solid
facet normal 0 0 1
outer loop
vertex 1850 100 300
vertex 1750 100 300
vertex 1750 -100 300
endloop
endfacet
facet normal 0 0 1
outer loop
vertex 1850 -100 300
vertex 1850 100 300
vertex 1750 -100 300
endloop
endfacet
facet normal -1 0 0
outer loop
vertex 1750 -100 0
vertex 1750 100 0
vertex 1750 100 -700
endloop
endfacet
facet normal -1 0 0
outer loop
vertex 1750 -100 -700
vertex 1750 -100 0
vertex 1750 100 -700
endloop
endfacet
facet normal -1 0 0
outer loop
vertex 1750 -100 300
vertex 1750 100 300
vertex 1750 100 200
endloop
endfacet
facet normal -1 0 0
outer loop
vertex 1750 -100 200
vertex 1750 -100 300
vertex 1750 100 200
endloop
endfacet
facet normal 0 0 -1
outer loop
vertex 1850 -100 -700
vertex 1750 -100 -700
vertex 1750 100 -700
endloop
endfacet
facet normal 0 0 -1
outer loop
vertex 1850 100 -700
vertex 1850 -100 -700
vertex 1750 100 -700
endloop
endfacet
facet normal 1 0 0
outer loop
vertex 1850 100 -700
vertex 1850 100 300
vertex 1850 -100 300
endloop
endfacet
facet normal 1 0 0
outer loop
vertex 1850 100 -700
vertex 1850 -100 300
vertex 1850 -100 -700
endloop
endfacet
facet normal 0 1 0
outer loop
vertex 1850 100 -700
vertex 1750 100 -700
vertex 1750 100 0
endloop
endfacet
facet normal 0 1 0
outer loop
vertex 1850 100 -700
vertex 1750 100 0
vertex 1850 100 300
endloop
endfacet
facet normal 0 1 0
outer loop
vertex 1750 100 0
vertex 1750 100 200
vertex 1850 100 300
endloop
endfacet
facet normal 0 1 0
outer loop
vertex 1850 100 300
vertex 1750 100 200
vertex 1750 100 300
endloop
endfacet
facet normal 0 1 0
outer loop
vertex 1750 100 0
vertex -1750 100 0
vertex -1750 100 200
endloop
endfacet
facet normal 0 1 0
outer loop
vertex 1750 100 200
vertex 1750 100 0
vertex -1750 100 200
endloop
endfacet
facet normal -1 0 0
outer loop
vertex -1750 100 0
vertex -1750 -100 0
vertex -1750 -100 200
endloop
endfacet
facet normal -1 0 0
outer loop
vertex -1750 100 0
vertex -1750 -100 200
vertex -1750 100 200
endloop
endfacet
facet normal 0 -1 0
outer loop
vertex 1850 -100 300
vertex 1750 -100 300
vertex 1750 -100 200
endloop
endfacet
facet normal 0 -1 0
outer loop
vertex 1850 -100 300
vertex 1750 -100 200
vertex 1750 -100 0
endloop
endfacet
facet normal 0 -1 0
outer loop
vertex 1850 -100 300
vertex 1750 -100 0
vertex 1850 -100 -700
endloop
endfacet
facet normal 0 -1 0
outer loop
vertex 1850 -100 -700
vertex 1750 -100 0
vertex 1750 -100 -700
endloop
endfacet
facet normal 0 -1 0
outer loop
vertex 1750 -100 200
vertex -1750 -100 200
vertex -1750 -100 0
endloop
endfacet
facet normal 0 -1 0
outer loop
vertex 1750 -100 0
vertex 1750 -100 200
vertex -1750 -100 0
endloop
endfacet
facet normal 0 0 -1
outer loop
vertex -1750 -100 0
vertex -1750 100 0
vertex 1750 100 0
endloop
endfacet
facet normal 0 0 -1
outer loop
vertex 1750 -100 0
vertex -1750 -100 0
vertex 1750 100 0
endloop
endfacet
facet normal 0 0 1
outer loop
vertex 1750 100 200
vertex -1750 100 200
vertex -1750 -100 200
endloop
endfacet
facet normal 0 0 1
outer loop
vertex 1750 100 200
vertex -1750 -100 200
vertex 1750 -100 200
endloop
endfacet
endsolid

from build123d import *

# Parameters (mm, degrees)
CROQUIS1_W              = 3500
CROQUIS1_H              = 200
SALIENTE_EXTRUIR1_DEPTH = 200
SALIENTE_EXTRUIR2_DEPTH = 100


with BuildPart() as part:
    # Croquis1 → Saliente-Extruir1 (new body)
    with BuildSketch(Plane.XY):
        Rectangle(CROQUIS1_W, CROQUIS1_H)
    extrude(amount=SALIENTE_EXTRUIR1_DEPTH)

    # Croquis2 → Saliente-Extruir2 (add)
    with BuildSketch(Plane(origin=(1750, 0, 0), x_dir=(0, 0, -1), z_dir=(1, 0, 0))):
        Polygon((0, 100), (-300, 100), (-300, -100), (0, -100), (700, -100), (700, 100), align=None)
    extrude(amount=SALIENTE_EXTRUIR2_DEPTH)


solid = part.part
